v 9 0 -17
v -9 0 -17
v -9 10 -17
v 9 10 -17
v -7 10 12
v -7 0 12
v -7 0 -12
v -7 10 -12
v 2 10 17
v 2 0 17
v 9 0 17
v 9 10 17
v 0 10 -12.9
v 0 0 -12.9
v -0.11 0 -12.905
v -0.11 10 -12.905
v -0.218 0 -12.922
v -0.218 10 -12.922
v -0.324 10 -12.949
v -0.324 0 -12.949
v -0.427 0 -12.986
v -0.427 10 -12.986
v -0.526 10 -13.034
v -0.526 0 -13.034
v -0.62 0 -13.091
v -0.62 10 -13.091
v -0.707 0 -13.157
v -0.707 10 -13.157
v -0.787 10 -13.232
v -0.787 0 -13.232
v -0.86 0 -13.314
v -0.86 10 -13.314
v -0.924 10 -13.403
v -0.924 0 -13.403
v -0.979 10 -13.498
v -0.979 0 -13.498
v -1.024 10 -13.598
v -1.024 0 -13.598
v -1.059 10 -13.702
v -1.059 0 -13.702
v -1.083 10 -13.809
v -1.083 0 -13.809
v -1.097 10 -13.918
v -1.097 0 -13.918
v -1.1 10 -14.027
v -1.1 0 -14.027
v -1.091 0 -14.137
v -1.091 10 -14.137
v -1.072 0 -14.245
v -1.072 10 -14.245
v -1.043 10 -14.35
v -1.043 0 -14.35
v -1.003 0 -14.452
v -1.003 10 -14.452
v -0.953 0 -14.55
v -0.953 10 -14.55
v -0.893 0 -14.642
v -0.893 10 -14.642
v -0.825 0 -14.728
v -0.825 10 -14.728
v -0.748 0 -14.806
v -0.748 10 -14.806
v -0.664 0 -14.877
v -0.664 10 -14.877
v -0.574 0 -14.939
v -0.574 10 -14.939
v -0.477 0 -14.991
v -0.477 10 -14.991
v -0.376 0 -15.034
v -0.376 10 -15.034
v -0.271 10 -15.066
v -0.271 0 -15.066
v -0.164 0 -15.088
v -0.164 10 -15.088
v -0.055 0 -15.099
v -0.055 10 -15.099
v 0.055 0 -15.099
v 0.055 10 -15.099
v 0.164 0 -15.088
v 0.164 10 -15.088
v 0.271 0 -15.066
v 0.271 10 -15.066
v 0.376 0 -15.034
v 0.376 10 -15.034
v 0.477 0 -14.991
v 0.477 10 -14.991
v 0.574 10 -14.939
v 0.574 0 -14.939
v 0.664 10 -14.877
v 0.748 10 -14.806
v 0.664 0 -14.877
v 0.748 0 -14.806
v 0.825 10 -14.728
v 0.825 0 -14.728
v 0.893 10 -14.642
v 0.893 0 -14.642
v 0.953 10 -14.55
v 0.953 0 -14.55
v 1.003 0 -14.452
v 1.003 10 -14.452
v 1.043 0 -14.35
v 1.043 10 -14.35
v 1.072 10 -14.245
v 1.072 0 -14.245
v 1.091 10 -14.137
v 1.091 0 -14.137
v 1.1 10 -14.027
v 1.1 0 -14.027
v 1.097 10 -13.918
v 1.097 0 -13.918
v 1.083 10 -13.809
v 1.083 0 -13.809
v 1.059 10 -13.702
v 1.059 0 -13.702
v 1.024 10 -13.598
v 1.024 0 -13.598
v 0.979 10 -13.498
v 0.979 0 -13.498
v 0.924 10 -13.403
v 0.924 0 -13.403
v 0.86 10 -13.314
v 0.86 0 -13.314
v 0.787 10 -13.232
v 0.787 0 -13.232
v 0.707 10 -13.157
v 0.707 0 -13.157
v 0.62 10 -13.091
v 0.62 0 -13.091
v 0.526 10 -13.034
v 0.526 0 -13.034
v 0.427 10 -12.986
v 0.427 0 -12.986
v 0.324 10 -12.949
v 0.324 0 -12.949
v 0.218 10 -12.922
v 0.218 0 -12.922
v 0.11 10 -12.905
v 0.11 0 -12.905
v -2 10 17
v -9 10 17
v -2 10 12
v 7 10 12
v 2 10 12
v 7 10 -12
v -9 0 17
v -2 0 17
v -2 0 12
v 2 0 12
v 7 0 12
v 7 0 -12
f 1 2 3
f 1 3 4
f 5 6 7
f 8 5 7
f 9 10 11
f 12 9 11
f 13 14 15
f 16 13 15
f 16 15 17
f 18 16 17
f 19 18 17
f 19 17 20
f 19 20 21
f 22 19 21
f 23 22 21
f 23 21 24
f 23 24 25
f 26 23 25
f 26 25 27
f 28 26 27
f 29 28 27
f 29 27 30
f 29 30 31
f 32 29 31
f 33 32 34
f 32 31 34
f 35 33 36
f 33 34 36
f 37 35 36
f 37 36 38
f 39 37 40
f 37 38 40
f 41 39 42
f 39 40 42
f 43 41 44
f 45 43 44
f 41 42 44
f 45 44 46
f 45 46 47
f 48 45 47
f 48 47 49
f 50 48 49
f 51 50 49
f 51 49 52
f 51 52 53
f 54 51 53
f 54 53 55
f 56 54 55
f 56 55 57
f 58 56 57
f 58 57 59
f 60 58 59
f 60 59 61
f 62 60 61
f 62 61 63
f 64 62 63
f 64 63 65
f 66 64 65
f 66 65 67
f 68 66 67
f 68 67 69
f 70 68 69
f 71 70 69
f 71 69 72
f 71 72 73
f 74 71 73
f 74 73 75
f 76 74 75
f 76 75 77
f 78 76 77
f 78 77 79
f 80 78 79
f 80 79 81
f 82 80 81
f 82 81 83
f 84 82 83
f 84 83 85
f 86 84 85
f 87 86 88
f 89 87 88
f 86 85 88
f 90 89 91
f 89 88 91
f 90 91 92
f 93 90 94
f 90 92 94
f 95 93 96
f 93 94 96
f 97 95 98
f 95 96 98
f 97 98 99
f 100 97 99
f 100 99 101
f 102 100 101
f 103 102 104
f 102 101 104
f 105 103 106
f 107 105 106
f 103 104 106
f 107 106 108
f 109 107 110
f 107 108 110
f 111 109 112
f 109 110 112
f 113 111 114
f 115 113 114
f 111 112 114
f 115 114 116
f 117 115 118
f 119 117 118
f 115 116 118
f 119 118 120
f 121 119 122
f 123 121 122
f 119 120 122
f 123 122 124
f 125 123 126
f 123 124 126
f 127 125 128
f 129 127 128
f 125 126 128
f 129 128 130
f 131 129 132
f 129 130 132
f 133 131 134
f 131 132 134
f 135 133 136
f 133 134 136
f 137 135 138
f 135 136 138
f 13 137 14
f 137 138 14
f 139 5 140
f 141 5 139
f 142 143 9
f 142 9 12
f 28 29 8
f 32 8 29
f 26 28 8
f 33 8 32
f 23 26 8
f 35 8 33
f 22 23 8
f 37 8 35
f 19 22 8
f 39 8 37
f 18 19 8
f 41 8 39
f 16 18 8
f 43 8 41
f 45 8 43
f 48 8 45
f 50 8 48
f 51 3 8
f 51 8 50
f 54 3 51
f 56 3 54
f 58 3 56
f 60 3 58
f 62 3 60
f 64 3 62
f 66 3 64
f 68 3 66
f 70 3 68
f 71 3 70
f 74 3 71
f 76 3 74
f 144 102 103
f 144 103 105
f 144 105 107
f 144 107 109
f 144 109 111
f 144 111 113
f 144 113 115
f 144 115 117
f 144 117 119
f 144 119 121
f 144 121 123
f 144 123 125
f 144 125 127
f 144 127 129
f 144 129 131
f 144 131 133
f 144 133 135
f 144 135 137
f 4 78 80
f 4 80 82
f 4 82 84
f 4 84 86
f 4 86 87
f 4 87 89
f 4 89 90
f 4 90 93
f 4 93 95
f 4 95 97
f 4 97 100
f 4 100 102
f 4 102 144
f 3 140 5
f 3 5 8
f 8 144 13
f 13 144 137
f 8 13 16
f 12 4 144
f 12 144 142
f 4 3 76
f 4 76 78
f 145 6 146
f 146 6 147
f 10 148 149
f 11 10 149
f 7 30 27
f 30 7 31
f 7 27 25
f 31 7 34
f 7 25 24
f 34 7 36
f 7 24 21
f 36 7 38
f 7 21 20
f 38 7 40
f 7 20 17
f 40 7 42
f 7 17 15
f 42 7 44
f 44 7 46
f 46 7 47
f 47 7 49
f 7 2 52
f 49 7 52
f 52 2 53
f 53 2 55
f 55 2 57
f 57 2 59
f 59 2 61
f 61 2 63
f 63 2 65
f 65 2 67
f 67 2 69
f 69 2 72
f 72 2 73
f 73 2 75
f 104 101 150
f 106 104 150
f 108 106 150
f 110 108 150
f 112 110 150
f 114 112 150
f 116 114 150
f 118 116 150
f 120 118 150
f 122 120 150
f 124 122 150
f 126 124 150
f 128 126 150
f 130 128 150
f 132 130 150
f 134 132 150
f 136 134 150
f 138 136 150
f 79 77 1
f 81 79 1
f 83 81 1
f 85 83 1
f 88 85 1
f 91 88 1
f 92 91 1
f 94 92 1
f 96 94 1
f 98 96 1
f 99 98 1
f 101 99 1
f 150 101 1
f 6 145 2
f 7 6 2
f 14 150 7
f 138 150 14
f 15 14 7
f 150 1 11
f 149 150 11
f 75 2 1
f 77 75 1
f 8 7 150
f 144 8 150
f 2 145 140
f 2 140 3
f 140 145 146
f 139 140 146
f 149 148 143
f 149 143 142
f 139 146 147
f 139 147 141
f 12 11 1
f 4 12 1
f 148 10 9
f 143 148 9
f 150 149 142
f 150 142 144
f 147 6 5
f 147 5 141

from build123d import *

# Parameters (mm, degrees)
SKETCH_1_W          = 18
SKETCH_1_H          = 34
SKETCH_1_W_2        = 14
SKETCH_1_H_2        = 24
EXTRUDE_1_DEPTH     = 10
SKETCH_2_R          = 1.1
CUT_EXTRUDE_1_DEPTH = 22.679483389
SKETCH_4_W          = 4
SKETCH_4_H          = 10
CUT_EXTRUDE_2_DEPTH = 10


with BuildPart() as part:
    # 草图1 → 凸台-拉伸1 (new body)
    with BuildSketch(Plane(origin=(0, 0, 0), x_dir=(1, 0, 0), z_dir=(0, 1, 0))):
        Rectangle(SKETCH_1_W, SKETCH_1_H)
        Rectangle(SKETCH_1_W_2, SKETCH_1_H_2, mode=Mode.SUBTRACT)
    extrude(amount=EXTRUDE_1_DEPTH)

    # 草图2 → 切除-拉伸1 (cut, through all)
    with BuildSketch(Plane.XZ):
        with Locations(Location((0, 14, 0), (0, 0, 270))):
            Circle(SKETCH_2_R)
        with Locations(Location((0, -14, 0), (0, 0, 90))):
            Circle(SKETCH_2_R)
    extrude(amount=-CUT_EXTRUDE_1_DEPTH, mode=Mode.SUBTRACT)

    # 草图4 → 切除-拉伸2 (cut)
    with BuildSketch(Plane.XY.offset(17)):
        with Locations((0, 5)):
            Rectangle(SKETCH_4_W, SKETCH_4_H)
    extrude(amount=-CUT_EXTRUDE_2_DEPTH, mode=Mode.SUBTRACT)


solid = part.part
